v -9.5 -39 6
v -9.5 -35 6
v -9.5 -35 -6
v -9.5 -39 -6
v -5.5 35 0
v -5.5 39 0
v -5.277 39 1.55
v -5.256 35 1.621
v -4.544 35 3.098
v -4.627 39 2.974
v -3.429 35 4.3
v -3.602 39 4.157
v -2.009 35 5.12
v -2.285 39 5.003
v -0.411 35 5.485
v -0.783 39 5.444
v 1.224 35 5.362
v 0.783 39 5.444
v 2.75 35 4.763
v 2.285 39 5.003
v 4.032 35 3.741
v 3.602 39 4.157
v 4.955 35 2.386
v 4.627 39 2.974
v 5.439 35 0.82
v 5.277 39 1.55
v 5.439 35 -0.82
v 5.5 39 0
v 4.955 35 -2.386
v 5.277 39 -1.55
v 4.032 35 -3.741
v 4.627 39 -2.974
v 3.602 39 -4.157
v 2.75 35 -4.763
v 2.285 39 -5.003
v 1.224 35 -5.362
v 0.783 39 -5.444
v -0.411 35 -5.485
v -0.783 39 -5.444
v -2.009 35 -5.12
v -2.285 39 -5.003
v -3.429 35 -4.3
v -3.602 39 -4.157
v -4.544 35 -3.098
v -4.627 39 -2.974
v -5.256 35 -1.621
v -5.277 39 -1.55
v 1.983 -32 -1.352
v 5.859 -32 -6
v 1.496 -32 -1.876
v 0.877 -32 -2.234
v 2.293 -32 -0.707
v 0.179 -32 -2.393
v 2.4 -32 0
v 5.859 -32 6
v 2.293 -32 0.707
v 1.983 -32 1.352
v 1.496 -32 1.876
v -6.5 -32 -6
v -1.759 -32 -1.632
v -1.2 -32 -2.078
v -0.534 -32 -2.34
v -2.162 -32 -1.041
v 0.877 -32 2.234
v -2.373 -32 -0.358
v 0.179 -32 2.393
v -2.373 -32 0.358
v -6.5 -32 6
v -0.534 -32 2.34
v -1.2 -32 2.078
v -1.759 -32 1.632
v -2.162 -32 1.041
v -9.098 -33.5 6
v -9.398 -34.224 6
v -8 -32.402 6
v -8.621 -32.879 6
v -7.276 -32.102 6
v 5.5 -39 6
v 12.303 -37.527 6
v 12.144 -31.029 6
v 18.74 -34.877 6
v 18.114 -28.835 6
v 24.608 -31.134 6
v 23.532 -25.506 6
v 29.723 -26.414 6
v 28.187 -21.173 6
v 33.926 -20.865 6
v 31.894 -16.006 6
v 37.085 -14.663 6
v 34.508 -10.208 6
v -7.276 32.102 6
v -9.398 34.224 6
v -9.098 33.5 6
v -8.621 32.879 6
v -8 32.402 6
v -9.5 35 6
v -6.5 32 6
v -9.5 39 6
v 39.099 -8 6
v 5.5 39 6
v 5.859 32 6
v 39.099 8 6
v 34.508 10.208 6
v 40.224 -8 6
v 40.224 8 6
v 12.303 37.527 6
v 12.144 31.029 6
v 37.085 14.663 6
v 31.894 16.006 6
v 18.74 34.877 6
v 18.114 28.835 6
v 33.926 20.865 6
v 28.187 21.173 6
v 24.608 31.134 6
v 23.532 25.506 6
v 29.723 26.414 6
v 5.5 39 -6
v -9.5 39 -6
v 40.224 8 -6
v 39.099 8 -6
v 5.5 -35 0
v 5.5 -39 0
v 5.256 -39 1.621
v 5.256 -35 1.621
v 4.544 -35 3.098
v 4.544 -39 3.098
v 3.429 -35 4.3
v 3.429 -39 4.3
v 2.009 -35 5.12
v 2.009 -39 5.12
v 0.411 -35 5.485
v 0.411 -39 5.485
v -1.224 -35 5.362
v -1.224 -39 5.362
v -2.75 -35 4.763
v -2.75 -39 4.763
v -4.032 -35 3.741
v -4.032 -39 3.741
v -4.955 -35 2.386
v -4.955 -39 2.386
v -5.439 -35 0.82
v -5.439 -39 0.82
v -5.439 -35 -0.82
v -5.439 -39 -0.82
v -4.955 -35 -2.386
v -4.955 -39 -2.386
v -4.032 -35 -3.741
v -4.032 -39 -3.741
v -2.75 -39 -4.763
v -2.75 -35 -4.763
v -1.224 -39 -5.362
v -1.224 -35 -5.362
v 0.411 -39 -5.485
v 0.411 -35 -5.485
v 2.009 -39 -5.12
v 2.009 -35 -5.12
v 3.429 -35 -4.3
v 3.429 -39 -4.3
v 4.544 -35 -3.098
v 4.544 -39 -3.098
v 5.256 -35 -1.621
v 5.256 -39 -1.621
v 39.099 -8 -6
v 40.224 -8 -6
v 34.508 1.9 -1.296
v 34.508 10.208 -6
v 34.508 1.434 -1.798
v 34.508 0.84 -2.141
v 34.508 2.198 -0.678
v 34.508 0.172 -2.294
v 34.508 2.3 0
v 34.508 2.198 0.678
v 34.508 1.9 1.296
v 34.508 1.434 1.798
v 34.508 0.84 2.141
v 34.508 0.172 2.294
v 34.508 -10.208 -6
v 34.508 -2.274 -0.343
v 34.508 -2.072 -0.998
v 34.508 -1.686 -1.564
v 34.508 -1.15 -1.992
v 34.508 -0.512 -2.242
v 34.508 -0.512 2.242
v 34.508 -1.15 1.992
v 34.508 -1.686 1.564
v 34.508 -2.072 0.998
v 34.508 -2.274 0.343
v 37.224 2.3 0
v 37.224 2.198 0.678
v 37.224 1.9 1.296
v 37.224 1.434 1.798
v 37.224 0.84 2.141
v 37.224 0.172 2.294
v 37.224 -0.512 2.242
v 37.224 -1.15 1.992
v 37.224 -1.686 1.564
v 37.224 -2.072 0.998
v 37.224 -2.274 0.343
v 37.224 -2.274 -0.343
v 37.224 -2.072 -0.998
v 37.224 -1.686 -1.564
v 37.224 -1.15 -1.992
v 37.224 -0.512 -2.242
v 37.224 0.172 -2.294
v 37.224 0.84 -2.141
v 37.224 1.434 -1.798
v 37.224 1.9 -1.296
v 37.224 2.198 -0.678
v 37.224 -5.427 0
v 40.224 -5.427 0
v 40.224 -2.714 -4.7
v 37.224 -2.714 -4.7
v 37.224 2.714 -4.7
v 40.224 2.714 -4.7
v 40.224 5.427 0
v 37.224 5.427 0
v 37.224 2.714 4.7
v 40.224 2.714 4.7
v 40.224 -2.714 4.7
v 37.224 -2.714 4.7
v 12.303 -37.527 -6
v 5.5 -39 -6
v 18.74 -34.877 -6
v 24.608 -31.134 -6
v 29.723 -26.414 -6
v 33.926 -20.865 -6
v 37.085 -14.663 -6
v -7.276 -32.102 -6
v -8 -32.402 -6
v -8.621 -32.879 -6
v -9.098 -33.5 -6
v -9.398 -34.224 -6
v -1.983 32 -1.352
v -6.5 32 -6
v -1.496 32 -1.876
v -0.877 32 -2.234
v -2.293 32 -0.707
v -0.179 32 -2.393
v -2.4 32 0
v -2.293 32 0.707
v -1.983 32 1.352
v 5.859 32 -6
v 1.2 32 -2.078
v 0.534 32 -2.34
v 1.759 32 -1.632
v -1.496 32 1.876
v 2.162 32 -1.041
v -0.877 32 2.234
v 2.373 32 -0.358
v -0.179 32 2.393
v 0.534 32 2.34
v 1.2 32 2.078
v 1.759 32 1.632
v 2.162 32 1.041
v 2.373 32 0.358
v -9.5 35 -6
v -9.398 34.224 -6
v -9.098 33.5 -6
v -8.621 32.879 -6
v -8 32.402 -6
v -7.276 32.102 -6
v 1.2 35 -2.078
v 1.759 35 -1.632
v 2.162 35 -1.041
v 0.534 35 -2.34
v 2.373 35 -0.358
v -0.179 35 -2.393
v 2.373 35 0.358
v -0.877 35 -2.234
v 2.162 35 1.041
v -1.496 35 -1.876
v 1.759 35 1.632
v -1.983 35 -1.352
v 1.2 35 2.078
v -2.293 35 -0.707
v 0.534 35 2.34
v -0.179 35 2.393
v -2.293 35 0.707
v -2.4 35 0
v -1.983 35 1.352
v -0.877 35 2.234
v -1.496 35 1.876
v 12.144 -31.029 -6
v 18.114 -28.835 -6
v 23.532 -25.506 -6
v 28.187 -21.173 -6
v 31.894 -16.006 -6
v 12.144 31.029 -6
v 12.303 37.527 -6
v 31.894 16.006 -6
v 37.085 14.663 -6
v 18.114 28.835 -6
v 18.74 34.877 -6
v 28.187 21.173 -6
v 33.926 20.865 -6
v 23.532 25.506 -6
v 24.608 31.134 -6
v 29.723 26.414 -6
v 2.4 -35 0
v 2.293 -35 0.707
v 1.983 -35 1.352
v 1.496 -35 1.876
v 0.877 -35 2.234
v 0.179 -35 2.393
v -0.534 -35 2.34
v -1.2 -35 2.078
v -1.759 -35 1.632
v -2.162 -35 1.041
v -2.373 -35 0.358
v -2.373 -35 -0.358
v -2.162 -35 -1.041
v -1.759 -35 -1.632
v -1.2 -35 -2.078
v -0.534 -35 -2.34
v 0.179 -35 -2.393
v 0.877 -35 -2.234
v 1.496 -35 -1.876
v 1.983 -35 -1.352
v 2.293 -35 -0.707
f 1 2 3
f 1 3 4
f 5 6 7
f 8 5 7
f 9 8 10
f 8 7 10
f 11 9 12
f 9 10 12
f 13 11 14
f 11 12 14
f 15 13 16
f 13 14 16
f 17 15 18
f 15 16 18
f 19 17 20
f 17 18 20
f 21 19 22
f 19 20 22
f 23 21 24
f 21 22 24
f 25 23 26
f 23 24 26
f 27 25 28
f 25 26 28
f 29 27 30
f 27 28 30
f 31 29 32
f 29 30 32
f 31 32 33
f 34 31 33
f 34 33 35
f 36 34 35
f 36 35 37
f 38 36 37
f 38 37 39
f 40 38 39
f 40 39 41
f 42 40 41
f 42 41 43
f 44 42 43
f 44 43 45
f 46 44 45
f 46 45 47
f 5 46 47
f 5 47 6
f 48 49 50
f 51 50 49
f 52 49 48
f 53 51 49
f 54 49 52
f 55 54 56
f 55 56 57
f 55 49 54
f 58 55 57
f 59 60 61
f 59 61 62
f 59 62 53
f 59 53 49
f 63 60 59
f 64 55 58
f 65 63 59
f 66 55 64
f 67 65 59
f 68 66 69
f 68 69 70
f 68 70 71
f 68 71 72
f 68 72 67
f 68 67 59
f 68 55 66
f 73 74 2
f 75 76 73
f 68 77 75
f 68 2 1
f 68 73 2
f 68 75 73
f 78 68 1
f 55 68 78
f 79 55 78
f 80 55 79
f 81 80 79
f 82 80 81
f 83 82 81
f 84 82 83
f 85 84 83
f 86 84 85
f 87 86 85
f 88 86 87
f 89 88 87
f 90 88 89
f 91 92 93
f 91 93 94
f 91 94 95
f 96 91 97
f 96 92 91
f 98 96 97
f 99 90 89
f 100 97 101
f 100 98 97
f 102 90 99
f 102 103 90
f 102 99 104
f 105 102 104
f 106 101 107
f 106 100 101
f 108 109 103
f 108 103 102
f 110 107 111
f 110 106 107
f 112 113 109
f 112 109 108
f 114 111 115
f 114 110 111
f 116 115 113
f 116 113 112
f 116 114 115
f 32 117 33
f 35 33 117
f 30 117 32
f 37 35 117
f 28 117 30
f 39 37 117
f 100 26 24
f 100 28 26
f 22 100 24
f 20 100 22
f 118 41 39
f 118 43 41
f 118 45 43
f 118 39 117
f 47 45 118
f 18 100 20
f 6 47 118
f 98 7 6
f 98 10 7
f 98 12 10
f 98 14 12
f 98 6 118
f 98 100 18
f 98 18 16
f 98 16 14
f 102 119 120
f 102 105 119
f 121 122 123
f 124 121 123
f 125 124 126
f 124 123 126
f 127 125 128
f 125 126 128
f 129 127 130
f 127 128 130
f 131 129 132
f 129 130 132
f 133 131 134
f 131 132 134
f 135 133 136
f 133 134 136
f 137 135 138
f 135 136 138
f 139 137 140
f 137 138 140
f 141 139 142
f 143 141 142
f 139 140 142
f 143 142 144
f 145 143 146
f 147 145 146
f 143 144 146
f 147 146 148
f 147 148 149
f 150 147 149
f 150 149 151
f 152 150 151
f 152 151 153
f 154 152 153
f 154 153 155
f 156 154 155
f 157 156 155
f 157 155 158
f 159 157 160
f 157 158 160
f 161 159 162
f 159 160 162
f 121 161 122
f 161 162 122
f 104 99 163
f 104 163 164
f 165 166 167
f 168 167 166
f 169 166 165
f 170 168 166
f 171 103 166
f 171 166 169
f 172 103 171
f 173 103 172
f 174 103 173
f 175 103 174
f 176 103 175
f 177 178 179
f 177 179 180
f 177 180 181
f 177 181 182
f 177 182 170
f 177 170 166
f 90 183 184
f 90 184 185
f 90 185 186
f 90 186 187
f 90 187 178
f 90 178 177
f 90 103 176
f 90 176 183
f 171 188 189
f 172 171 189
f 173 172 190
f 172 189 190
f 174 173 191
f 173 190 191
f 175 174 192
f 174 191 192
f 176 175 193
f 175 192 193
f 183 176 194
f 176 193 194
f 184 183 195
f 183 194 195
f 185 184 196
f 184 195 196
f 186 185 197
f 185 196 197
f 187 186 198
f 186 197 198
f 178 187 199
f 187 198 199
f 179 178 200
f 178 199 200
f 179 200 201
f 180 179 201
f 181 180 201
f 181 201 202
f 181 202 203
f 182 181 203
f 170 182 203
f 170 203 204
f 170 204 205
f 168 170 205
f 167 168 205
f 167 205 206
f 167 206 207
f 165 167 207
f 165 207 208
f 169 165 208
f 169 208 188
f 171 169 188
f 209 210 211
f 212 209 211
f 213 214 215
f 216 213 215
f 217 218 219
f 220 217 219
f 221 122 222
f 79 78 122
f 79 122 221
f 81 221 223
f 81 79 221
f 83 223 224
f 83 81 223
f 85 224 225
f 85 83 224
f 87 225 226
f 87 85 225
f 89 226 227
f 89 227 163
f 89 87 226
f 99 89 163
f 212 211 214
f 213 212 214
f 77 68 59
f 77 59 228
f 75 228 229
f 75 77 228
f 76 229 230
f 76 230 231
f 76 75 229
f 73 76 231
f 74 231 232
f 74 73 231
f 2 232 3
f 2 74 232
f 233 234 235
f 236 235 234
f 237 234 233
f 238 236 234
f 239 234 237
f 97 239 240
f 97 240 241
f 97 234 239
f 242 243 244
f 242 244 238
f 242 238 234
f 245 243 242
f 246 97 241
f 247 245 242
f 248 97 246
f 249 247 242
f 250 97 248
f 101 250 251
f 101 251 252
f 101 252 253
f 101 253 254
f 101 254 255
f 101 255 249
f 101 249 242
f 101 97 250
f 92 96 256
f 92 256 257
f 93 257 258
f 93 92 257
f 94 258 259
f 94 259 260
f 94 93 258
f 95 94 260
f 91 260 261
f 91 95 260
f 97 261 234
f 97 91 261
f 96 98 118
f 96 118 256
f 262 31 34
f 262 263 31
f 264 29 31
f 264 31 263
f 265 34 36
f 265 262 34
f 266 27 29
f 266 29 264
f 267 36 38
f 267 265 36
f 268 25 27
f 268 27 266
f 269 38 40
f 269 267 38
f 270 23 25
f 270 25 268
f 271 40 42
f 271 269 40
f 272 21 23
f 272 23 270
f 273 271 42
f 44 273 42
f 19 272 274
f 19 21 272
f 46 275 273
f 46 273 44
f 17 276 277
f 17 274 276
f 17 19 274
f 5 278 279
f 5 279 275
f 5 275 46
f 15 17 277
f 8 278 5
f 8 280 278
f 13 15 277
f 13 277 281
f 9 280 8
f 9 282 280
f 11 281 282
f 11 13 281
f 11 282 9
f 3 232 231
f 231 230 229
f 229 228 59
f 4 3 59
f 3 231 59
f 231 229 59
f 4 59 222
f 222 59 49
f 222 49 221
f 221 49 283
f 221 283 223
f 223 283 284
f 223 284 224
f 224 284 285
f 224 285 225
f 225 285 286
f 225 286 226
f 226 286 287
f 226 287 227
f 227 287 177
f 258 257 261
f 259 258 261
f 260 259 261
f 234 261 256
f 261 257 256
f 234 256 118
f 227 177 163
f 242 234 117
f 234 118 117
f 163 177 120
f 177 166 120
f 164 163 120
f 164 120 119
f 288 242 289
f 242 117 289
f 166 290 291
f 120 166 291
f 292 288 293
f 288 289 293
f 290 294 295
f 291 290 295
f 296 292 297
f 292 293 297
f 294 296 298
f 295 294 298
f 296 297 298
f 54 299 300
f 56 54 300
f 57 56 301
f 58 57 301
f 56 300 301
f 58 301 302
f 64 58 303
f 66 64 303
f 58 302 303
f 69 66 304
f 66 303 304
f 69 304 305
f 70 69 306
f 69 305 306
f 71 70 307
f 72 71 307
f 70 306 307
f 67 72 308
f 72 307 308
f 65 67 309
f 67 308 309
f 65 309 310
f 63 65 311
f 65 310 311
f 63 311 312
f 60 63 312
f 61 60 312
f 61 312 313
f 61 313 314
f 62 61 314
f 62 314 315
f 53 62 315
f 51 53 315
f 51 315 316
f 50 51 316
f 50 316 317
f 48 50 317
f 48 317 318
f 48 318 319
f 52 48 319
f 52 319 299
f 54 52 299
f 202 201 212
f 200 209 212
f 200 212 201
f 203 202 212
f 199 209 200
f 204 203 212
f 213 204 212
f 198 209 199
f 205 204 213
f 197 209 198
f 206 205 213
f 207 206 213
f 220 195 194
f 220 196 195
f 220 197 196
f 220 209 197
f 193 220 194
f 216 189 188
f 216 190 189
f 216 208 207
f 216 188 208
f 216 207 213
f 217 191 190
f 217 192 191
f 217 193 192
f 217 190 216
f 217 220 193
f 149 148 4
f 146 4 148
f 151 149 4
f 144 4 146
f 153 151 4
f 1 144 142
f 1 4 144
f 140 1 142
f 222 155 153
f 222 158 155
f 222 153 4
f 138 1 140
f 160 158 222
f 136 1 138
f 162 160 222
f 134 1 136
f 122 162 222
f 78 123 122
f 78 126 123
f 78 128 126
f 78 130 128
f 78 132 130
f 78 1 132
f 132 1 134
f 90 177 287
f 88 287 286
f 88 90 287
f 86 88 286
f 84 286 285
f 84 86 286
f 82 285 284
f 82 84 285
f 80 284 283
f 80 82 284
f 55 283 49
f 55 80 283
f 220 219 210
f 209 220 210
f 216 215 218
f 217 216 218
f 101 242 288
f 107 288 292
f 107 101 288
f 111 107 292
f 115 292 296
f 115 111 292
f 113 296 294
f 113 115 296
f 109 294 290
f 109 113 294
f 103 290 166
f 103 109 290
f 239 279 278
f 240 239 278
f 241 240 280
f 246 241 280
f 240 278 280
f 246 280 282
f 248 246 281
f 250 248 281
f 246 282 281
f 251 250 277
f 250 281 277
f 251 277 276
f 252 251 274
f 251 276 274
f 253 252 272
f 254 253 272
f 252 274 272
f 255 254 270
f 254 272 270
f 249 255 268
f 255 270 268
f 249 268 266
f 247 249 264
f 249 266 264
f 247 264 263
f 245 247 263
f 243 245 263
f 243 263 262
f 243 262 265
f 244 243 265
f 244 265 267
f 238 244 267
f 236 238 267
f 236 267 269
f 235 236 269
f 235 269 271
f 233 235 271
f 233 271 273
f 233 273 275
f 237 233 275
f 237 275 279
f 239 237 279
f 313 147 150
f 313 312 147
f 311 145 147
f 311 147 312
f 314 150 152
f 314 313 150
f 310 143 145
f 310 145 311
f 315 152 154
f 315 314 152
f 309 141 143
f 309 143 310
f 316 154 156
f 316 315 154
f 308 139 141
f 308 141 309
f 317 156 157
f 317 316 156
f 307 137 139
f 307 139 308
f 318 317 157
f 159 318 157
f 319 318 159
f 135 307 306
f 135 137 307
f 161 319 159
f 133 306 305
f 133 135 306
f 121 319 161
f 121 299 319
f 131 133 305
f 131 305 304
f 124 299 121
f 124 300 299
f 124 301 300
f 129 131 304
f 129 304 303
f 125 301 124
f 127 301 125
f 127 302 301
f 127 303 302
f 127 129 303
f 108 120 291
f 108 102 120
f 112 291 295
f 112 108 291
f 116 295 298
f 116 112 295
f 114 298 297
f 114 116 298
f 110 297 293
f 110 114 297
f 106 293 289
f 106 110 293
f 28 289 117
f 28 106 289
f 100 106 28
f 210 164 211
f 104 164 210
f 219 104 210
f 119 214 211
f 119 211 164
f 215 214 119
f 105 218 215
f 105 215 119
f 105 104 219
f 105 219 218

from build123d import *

# Parameters (mm, degrees)
F0_W          = 11
F0_H          = 4
F1_DEPTH      = 6
F1_DEPTH_BACK = 6
F2_R          = 5.5
F2_R_2        = 2.4
F3_DEPTH      = 4
F4_DEPTH      = 10.8
F5_R          = 2.4
F6_DEPTH      = 4
F7_DEPTH      = 10
F8_R          = 2.3
F9_DEPTH      = 3
F10_DEPTH     = 14


# Not quite as in the source:
# - a feature names something its author has since deleted; it is built from what else it names


with BuildPart() as f1:
    # F0 (on Top) → F1 (new body, two sides)
    with BuildSketch(Plane.XY) as f1_sk:
        with Locations((0, 37)):
            Rectangle(F0_W, F0_H)
        with BuildLine():
            ThreePointArc((-9.5, 35), (-8.6213203436, 32.8786796564), (-6.5, 32))
            Line((-6.5, 32), (5.8594679956, 32))
            ThreePointArc((5.8594679956, 32), (23.5324507486, 25.5063318649), (34.5083337044, 10.2082261463))
            Line((34.5083337044, 10.2082261463), (34.5083337044, -10.2082261463))
            ThreePointArc((34.5083337044, -10.2082261463), (23.5324507486, -25.5063318649), (5.8594679956, -32))
            Line((5.8594679956, -32), (-6.5, -32))
            ThreePointArc((-6.5, -32), (-8.6213203436, -32.8786796564), (-9.5, -35))
            Line((-9.5, -35), (-9.5, -39))
            Line((-9.5, -39), (-5.5, -39))
            Line((-5.5, -39), (-5.5, -35))
            Line((-5.5, -35), (5.5, -35))
            Line((5.5, -35), (5.5, -39))
            ThreePointArc((5.5, -39), (27.2702801405, -28.8873683489), (39.0994077402, -8))
            Line((39.0994077402, -8), (40.2236692607, -8))
            Line((40.2236692607, -8), (40.2236692607, 8))
            Line((40.2236692607, 8), (39.0994077402, 8))
            ThreePointArc((39.0994077402, 8), (27.2702801405, 28.8873683489), (5.5, 39))
            Line((5.5, 39), (5.5, 35))
            Line((5.5, 35), (-5.5, 35))
            Line((-5.5, 35), (-5.5, 39))
            Line((-5.5, 39), (-9.5, 39))
            Line((-9.5, 39), (-9.5, 35))
        make_face()
        with Locations((0, -37)):
            Rectangle(F0_W, F0_H)
    extrude(amount=F1_DEPTH)
    extrude(f1_sk.sketch, amount=-F1_DEPTH_BACK)

    # F2 (on face) → F3 (cut)
    with BuildSketch(Plane.XZ.offset(39)):
        Circle(F2_R)
        Circle(F2_R_2, mode=Mode.SUBTRACT)
    extrude(amount=-F3_DEPTH, mode=Mode.SUBTRACT)

    # F4 (cut): a face of the model
    f4_faces = [f1.faces().sort_by_distance(p)[0] for p in [
        (0, -39, 0),
    ]]
    extrude(f4_faces, amount=-F4_DEPTH, mode=Mode.SUBTRACT)

    # F5 (on face) → F6 (cut)
    with BuildSketch(Plane(origin=(0, 39, 0), x_dir=(-1, 0, 0), z_dir=(0, 1, 0))):
        with BuildLine():
            ThreePointArc((-5.5, 3.96e-08), (-1.98e-08, -5.5), (5.5, 0))
            ThreePointArc((5.5, 0), (1.98e-08, 5.5), (-5.5, 3.96e-08))
        make_face()
        Circle(F5_R, mode=Mode.SUBTRACT)
    extrude(amount=-F6_DEPTH, mode=Mode.SUBTRACT)

    # F7 (cut): a face of the model
    f7_faces = [f1.faces().sort_by_distance(p)[0] for p in [
        (0, 39, 0),
    ]]
    extrude(f7_faces, amount=-F7_DEPTH, mode=Mode.SUBTRACT)

    # F8 (on face) → F9 (cut)
    with BuildSketch(Plane.YZ.offset(40.2236692607)):
        Polygon((2.7135462652, -4.7), (5.4270925304, 0), (2.7135462652, 4.7), (-2.7135462652, 4.7), (-5.4270925304, 0), (-2.7135462652, -4.7), align=None)
        Circle(F8_R, mode=Mode.SUBTRACT)
    extrude(amount=-F9_DEPTH, mode=Mode.SUBTRACT)

    # F10 (cut): a face of the model
    f10_faces = [f1.faces().sort_by_distance(p)[0] for p in [
        (40.2236692607, 0, 0),
    ]]
    extrude(f10_faces, amount=-F10_DEPTH, mode=Mode.SUBTRACT)


solid = f1.part
